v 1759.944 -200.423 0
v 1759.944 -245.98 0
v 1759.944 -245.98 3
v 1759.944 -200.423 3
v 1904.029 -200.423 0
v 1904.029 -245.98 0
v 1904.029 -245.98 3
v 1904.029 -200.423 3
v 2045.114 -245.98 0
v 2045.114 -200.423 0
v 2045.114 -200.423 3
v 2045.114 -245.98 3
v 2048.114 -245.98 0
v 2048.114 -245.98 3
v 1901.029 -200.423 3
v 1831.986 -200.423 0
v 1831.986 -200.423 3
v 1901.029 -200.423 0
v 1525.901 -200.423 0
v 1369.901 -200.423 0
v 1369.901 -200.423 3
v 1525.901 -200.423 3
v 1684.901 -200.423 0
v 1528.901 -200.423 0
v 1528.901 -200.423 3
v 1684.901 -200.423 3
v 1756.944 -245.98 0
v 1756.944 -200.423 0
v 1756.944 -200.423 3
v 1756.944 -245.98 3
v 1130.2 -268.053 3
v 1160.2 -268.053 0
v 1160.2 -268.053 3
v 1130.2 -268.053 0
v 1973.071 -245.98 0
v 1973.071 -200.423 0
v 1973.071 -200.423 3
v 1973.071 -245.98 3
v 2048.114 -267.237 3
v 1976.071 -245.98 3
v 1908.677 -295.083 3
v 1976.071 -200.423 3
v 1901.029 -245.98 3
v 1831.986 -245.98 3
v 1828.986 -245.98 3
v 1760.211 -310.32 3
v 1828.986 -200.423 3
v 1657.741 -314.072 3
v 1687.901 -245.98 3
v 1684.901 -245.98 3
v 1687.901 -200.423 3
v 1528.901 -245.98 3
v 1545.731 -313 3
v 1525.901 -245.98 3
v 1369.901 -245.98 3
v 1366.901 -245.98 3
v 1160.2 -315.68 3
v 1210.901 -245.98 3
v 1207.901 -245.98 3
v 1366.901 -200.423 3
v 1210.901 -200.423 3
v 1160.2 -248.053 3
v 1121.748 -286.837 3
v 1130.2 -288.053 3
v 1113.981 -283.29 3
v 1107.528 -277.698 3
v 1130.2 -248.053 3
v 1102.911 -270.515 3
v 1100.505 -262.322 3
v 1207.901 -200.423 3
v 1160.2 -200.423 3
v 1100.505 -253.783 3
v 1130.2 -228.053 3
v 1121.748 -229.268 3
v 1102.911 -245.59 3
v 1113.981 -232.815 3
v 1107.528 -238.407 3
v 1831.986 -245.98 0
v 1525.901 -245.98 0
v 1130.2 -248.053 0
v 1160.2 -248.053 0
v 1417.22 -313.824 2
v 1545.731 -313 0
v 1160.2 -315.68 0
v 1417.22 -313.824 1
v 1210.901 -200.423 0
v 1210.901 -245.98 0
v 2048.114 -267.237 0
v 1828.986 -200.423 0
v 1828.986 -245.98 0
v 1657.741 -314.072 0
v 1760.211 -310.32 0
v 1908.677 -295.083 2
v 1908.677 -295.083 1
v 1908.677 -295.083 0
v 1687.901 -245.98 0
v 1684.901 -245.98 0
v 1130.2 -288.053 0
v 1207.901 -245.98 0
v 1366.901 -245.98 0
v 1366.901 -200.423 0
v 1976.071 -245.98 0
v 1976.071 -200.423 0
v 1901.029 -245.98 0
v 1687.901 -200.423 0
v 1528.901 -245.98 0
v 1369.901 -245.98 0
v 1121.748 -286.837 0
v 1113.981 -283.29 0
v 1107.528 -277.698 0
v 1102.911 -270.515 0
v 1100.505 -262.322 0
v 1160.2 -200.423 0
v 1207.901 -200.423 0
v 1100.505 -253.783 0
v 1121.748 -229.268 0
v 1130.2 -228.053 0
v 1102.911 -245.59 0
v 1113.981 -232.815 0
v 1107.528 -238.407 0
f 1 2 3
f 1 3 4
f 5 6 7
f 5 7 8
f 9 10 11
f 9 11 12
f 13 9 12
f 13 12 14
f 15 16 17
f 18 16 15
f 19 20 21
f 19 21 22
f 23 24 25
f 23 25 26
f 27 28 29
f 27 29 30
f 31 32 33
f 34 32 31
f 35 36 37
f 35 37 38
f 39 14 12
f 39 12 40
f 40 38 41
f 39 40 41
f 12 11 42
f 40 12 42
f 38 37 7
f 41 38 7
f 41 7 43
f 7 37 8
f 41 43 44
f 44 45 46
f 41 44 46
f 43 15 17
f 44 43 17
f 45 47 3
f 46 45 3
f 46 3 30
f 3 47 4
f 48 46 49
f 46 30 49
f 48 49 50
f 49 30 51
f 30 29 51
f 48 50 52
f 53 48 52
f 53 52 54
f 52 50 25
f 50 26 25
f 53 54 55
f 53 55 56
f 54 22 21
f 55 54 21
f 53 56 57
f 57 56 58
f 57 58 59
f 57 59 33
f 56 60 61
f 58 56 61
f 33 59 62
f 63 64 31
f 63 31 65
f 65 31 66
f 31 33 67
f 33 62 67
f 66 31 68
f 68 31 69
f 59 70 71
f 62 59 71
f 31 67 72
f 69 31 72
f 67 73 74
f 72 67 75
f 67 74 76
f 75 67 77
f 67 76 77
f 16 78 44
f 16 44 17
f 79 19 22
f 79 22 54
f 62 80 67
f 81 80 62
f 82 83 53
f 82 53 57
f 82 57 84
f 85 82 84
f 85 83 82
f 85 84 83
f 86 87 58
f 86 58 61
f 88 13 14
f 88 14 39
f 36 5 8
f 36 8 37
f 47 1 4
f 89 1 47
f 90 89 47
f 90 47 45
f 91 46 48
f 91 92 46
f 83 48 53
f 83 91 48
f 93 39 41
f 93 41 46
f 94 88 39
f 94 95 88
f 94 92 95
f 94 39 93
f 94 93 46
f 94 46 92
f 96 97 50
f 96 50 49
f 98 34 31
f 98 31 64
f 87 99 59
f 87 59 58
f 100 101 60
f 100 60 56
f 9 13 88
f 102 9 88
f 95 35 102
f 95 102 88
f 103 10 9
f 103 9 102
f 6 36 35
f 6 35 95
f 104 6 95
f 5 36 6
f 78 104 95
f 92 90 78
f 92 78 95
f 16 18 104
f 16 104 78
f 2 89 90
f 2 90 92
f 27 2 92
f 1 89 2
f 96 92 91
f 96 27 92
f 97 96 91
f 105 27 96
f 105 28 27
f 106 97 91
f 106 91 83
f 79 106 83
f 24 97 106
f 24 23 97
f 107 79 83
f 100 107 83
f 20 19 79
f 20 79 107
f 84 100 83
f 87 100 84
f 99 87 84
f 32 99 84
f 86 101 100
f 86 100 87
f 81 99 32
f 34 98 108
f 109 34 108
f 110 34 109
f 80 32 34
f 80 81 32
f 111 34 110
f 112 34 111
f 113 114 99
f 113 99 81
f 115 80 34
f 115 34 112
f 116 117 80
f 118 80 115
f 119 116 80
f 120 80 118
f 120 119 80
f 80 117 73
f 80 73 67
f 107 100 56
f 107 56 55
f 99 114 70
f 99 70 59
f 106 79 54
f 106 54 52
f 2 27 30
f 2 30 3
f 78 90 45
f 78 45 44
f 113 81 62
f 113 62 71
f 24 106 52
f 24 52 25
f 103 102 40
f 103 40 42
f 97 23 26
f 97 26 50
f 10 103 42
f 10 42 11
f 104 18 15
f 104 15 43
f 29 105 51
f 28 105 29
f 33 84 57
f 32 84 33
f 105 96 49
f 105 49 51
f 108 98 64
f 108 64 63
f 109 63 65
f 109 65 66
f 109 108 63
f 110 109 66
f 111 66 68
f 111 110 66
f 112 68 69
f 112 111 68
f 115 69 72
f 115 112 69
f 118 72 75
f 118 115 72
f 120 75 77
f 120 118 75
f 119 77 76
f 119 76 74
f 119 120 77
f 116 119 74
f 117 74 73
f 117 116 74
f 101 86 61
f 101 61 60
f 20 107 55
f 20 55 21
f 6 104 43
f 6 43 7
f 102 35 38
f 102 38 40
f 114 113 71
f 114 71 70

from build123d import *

# Parameters (mm, degrees)
BOSS_EXTRUDE1_DEPTH = 3


with BuildPart() as part:
    # Model → Boss-Extrude1 (new body)
    with BuildSketch(Plane.XY):
        with BuildLine():
            Line((1130.2, -228.052661621), (1130.2, -248.052661621))
            Line((1130.2, -248.052661621), (1160.2, -248.052661621))
            Line((1160.2, -248.052661621), (1160.2, -200.422661621))
            Line((1160.2, -200.422661621), (1207.901037796, -200.422661621))
            Line((1207.901037796, -200.422661621), (1207.901037796, -245.979700014))
            Line((1207.901037796, -245.979700014), (1210.901037796, -245.979700014))
            Line((1210.901037796, -245.979700014), (1210.901037796, -200.422661621))
            Line((1210.901037796, -200.422661621), (1366.901037796, -200.422661621))
            Line((1366.901037796, -200.422661621), (1366.901037796, -245.979700014))
            Line((1366.901037796, -245.979700014), (1369.901037796, -245.979700014))
            Line((1369.901037796, -245.979700014), (1369.901037796, -200.422661621))
            Line((1369.901037796, -200.422661621), (1525.901037796, -200.422661621))
            Line((1525.901037796, -200.422661621), (1525.901037796, -245.979700014))
            Line((1525.901037796, -245.979700014), (1528.901037796, -245.979700014))
            Line((1528.901037796, -245.979700014), (1528.901037796, -200.422661621))
            Line((1528.901037796, -200.422661621), (1684.901037801, -200.422661621))
            Line((1684.901037801, -200.422661621), (1684.901037801, -245.979700014))
            Line((1684.901037801, -245.979700014), (1687.901037795, -245.979700014))
            Line((1687.901037795, -245.979700014), (1687.901037795, -200.422661621))
            Line((1687.901037795, -200.422661621), (1756.943542984, -200.422661621))
            Line((1756.943542984, -200.422661621), (1756.943542984, -245.979700014))
            Line((1756.943542984, -245.979700014), (1759.943542984, -245.979700014))
            Line((1759.943542984, -245.979700014), (1759.943542984, -200.422661621))
            Line((1759.943542984, -200.422661621), (1828.986048173, -200.422661621))
            Line((1828.986048173, -200.422661621), (1828.986048173, -245.979700014))
            Line((1828.986048173, -245.979700014), (1831.986048173, -245.979700014))
            Line((1831.986048173, -245.979700014), (1831.986048173, -200.422661621))
            Line((1831.986048173, -200.422661621), (1901.028553362, -200.422661621))
            Line((1901.028553362, -200.422661621), (1901.028553362, -245.979700014))
            Line((1901.028553362, -245.979700014), (1904.028553362, -245.979700014))
            Line((1904.028553362, -245.979700014), (1904.028553362, -200.422661621))
            Line((1904.028553362, -200.422661621), (1973.071058551, -200.422661621))
            Line((1973.071058551, -200.422661621), (1973.071058551, -245.979700014))
            Line((1973.071058551, -245.979700014), (1976.071058551, -245.979700014))
            Line((1976.071058551, -245.979700014), (1976.071058551, -200.422661621))
            Line((1976.071058551, -200.422661621), (2045.113563739, -200.422661621))
            Line((2045.113563739, -200.422661621), (2045.113563739, -245.979700014))
            Line((2045.113563739, -245.979700014), (2048.11356374, -245.979700014))
            Line((2048.11356374, -245.979700014), (2048.11356374, -267.236738408))
            add(Edge.make_bspline(
                [(2048.11356374, -267.236738408), (1921.116123258, -299.875981212), (1758.376470444, -319.638055471), (1545.730966639, -313)],
                knots=[0.571508356, 0.571508356, 0.571508356, 0.571508356, 1, 1, 1, 1], degree=3))
            add(Edge.make_bspline(
                [(1545.730966639, -313), (1417.219843878, -313.786784413), (1288.709572371, -314.686711241), (1160.2, -315.679561973)],
                knots=[0, 0, 0, 0, 1, 1, 1, 1], degree=3))
            Line((1160.2, -315.679561973), (1160.2, -268.052661621))
            Line((1160.2, -268.052661621), (1130.2, -268.052661621))
            Line((1130.2, -268.052661621), (1130.2, -288.052661621))
            ThreePointArc((1130.2, -288.052661621), (1100.2, -258.052661621), (1130.2, -228.052661621))
        make_face()
    extrude(amount=BOSS_EXTRUDE1_DEPTH)


solid = part.part
